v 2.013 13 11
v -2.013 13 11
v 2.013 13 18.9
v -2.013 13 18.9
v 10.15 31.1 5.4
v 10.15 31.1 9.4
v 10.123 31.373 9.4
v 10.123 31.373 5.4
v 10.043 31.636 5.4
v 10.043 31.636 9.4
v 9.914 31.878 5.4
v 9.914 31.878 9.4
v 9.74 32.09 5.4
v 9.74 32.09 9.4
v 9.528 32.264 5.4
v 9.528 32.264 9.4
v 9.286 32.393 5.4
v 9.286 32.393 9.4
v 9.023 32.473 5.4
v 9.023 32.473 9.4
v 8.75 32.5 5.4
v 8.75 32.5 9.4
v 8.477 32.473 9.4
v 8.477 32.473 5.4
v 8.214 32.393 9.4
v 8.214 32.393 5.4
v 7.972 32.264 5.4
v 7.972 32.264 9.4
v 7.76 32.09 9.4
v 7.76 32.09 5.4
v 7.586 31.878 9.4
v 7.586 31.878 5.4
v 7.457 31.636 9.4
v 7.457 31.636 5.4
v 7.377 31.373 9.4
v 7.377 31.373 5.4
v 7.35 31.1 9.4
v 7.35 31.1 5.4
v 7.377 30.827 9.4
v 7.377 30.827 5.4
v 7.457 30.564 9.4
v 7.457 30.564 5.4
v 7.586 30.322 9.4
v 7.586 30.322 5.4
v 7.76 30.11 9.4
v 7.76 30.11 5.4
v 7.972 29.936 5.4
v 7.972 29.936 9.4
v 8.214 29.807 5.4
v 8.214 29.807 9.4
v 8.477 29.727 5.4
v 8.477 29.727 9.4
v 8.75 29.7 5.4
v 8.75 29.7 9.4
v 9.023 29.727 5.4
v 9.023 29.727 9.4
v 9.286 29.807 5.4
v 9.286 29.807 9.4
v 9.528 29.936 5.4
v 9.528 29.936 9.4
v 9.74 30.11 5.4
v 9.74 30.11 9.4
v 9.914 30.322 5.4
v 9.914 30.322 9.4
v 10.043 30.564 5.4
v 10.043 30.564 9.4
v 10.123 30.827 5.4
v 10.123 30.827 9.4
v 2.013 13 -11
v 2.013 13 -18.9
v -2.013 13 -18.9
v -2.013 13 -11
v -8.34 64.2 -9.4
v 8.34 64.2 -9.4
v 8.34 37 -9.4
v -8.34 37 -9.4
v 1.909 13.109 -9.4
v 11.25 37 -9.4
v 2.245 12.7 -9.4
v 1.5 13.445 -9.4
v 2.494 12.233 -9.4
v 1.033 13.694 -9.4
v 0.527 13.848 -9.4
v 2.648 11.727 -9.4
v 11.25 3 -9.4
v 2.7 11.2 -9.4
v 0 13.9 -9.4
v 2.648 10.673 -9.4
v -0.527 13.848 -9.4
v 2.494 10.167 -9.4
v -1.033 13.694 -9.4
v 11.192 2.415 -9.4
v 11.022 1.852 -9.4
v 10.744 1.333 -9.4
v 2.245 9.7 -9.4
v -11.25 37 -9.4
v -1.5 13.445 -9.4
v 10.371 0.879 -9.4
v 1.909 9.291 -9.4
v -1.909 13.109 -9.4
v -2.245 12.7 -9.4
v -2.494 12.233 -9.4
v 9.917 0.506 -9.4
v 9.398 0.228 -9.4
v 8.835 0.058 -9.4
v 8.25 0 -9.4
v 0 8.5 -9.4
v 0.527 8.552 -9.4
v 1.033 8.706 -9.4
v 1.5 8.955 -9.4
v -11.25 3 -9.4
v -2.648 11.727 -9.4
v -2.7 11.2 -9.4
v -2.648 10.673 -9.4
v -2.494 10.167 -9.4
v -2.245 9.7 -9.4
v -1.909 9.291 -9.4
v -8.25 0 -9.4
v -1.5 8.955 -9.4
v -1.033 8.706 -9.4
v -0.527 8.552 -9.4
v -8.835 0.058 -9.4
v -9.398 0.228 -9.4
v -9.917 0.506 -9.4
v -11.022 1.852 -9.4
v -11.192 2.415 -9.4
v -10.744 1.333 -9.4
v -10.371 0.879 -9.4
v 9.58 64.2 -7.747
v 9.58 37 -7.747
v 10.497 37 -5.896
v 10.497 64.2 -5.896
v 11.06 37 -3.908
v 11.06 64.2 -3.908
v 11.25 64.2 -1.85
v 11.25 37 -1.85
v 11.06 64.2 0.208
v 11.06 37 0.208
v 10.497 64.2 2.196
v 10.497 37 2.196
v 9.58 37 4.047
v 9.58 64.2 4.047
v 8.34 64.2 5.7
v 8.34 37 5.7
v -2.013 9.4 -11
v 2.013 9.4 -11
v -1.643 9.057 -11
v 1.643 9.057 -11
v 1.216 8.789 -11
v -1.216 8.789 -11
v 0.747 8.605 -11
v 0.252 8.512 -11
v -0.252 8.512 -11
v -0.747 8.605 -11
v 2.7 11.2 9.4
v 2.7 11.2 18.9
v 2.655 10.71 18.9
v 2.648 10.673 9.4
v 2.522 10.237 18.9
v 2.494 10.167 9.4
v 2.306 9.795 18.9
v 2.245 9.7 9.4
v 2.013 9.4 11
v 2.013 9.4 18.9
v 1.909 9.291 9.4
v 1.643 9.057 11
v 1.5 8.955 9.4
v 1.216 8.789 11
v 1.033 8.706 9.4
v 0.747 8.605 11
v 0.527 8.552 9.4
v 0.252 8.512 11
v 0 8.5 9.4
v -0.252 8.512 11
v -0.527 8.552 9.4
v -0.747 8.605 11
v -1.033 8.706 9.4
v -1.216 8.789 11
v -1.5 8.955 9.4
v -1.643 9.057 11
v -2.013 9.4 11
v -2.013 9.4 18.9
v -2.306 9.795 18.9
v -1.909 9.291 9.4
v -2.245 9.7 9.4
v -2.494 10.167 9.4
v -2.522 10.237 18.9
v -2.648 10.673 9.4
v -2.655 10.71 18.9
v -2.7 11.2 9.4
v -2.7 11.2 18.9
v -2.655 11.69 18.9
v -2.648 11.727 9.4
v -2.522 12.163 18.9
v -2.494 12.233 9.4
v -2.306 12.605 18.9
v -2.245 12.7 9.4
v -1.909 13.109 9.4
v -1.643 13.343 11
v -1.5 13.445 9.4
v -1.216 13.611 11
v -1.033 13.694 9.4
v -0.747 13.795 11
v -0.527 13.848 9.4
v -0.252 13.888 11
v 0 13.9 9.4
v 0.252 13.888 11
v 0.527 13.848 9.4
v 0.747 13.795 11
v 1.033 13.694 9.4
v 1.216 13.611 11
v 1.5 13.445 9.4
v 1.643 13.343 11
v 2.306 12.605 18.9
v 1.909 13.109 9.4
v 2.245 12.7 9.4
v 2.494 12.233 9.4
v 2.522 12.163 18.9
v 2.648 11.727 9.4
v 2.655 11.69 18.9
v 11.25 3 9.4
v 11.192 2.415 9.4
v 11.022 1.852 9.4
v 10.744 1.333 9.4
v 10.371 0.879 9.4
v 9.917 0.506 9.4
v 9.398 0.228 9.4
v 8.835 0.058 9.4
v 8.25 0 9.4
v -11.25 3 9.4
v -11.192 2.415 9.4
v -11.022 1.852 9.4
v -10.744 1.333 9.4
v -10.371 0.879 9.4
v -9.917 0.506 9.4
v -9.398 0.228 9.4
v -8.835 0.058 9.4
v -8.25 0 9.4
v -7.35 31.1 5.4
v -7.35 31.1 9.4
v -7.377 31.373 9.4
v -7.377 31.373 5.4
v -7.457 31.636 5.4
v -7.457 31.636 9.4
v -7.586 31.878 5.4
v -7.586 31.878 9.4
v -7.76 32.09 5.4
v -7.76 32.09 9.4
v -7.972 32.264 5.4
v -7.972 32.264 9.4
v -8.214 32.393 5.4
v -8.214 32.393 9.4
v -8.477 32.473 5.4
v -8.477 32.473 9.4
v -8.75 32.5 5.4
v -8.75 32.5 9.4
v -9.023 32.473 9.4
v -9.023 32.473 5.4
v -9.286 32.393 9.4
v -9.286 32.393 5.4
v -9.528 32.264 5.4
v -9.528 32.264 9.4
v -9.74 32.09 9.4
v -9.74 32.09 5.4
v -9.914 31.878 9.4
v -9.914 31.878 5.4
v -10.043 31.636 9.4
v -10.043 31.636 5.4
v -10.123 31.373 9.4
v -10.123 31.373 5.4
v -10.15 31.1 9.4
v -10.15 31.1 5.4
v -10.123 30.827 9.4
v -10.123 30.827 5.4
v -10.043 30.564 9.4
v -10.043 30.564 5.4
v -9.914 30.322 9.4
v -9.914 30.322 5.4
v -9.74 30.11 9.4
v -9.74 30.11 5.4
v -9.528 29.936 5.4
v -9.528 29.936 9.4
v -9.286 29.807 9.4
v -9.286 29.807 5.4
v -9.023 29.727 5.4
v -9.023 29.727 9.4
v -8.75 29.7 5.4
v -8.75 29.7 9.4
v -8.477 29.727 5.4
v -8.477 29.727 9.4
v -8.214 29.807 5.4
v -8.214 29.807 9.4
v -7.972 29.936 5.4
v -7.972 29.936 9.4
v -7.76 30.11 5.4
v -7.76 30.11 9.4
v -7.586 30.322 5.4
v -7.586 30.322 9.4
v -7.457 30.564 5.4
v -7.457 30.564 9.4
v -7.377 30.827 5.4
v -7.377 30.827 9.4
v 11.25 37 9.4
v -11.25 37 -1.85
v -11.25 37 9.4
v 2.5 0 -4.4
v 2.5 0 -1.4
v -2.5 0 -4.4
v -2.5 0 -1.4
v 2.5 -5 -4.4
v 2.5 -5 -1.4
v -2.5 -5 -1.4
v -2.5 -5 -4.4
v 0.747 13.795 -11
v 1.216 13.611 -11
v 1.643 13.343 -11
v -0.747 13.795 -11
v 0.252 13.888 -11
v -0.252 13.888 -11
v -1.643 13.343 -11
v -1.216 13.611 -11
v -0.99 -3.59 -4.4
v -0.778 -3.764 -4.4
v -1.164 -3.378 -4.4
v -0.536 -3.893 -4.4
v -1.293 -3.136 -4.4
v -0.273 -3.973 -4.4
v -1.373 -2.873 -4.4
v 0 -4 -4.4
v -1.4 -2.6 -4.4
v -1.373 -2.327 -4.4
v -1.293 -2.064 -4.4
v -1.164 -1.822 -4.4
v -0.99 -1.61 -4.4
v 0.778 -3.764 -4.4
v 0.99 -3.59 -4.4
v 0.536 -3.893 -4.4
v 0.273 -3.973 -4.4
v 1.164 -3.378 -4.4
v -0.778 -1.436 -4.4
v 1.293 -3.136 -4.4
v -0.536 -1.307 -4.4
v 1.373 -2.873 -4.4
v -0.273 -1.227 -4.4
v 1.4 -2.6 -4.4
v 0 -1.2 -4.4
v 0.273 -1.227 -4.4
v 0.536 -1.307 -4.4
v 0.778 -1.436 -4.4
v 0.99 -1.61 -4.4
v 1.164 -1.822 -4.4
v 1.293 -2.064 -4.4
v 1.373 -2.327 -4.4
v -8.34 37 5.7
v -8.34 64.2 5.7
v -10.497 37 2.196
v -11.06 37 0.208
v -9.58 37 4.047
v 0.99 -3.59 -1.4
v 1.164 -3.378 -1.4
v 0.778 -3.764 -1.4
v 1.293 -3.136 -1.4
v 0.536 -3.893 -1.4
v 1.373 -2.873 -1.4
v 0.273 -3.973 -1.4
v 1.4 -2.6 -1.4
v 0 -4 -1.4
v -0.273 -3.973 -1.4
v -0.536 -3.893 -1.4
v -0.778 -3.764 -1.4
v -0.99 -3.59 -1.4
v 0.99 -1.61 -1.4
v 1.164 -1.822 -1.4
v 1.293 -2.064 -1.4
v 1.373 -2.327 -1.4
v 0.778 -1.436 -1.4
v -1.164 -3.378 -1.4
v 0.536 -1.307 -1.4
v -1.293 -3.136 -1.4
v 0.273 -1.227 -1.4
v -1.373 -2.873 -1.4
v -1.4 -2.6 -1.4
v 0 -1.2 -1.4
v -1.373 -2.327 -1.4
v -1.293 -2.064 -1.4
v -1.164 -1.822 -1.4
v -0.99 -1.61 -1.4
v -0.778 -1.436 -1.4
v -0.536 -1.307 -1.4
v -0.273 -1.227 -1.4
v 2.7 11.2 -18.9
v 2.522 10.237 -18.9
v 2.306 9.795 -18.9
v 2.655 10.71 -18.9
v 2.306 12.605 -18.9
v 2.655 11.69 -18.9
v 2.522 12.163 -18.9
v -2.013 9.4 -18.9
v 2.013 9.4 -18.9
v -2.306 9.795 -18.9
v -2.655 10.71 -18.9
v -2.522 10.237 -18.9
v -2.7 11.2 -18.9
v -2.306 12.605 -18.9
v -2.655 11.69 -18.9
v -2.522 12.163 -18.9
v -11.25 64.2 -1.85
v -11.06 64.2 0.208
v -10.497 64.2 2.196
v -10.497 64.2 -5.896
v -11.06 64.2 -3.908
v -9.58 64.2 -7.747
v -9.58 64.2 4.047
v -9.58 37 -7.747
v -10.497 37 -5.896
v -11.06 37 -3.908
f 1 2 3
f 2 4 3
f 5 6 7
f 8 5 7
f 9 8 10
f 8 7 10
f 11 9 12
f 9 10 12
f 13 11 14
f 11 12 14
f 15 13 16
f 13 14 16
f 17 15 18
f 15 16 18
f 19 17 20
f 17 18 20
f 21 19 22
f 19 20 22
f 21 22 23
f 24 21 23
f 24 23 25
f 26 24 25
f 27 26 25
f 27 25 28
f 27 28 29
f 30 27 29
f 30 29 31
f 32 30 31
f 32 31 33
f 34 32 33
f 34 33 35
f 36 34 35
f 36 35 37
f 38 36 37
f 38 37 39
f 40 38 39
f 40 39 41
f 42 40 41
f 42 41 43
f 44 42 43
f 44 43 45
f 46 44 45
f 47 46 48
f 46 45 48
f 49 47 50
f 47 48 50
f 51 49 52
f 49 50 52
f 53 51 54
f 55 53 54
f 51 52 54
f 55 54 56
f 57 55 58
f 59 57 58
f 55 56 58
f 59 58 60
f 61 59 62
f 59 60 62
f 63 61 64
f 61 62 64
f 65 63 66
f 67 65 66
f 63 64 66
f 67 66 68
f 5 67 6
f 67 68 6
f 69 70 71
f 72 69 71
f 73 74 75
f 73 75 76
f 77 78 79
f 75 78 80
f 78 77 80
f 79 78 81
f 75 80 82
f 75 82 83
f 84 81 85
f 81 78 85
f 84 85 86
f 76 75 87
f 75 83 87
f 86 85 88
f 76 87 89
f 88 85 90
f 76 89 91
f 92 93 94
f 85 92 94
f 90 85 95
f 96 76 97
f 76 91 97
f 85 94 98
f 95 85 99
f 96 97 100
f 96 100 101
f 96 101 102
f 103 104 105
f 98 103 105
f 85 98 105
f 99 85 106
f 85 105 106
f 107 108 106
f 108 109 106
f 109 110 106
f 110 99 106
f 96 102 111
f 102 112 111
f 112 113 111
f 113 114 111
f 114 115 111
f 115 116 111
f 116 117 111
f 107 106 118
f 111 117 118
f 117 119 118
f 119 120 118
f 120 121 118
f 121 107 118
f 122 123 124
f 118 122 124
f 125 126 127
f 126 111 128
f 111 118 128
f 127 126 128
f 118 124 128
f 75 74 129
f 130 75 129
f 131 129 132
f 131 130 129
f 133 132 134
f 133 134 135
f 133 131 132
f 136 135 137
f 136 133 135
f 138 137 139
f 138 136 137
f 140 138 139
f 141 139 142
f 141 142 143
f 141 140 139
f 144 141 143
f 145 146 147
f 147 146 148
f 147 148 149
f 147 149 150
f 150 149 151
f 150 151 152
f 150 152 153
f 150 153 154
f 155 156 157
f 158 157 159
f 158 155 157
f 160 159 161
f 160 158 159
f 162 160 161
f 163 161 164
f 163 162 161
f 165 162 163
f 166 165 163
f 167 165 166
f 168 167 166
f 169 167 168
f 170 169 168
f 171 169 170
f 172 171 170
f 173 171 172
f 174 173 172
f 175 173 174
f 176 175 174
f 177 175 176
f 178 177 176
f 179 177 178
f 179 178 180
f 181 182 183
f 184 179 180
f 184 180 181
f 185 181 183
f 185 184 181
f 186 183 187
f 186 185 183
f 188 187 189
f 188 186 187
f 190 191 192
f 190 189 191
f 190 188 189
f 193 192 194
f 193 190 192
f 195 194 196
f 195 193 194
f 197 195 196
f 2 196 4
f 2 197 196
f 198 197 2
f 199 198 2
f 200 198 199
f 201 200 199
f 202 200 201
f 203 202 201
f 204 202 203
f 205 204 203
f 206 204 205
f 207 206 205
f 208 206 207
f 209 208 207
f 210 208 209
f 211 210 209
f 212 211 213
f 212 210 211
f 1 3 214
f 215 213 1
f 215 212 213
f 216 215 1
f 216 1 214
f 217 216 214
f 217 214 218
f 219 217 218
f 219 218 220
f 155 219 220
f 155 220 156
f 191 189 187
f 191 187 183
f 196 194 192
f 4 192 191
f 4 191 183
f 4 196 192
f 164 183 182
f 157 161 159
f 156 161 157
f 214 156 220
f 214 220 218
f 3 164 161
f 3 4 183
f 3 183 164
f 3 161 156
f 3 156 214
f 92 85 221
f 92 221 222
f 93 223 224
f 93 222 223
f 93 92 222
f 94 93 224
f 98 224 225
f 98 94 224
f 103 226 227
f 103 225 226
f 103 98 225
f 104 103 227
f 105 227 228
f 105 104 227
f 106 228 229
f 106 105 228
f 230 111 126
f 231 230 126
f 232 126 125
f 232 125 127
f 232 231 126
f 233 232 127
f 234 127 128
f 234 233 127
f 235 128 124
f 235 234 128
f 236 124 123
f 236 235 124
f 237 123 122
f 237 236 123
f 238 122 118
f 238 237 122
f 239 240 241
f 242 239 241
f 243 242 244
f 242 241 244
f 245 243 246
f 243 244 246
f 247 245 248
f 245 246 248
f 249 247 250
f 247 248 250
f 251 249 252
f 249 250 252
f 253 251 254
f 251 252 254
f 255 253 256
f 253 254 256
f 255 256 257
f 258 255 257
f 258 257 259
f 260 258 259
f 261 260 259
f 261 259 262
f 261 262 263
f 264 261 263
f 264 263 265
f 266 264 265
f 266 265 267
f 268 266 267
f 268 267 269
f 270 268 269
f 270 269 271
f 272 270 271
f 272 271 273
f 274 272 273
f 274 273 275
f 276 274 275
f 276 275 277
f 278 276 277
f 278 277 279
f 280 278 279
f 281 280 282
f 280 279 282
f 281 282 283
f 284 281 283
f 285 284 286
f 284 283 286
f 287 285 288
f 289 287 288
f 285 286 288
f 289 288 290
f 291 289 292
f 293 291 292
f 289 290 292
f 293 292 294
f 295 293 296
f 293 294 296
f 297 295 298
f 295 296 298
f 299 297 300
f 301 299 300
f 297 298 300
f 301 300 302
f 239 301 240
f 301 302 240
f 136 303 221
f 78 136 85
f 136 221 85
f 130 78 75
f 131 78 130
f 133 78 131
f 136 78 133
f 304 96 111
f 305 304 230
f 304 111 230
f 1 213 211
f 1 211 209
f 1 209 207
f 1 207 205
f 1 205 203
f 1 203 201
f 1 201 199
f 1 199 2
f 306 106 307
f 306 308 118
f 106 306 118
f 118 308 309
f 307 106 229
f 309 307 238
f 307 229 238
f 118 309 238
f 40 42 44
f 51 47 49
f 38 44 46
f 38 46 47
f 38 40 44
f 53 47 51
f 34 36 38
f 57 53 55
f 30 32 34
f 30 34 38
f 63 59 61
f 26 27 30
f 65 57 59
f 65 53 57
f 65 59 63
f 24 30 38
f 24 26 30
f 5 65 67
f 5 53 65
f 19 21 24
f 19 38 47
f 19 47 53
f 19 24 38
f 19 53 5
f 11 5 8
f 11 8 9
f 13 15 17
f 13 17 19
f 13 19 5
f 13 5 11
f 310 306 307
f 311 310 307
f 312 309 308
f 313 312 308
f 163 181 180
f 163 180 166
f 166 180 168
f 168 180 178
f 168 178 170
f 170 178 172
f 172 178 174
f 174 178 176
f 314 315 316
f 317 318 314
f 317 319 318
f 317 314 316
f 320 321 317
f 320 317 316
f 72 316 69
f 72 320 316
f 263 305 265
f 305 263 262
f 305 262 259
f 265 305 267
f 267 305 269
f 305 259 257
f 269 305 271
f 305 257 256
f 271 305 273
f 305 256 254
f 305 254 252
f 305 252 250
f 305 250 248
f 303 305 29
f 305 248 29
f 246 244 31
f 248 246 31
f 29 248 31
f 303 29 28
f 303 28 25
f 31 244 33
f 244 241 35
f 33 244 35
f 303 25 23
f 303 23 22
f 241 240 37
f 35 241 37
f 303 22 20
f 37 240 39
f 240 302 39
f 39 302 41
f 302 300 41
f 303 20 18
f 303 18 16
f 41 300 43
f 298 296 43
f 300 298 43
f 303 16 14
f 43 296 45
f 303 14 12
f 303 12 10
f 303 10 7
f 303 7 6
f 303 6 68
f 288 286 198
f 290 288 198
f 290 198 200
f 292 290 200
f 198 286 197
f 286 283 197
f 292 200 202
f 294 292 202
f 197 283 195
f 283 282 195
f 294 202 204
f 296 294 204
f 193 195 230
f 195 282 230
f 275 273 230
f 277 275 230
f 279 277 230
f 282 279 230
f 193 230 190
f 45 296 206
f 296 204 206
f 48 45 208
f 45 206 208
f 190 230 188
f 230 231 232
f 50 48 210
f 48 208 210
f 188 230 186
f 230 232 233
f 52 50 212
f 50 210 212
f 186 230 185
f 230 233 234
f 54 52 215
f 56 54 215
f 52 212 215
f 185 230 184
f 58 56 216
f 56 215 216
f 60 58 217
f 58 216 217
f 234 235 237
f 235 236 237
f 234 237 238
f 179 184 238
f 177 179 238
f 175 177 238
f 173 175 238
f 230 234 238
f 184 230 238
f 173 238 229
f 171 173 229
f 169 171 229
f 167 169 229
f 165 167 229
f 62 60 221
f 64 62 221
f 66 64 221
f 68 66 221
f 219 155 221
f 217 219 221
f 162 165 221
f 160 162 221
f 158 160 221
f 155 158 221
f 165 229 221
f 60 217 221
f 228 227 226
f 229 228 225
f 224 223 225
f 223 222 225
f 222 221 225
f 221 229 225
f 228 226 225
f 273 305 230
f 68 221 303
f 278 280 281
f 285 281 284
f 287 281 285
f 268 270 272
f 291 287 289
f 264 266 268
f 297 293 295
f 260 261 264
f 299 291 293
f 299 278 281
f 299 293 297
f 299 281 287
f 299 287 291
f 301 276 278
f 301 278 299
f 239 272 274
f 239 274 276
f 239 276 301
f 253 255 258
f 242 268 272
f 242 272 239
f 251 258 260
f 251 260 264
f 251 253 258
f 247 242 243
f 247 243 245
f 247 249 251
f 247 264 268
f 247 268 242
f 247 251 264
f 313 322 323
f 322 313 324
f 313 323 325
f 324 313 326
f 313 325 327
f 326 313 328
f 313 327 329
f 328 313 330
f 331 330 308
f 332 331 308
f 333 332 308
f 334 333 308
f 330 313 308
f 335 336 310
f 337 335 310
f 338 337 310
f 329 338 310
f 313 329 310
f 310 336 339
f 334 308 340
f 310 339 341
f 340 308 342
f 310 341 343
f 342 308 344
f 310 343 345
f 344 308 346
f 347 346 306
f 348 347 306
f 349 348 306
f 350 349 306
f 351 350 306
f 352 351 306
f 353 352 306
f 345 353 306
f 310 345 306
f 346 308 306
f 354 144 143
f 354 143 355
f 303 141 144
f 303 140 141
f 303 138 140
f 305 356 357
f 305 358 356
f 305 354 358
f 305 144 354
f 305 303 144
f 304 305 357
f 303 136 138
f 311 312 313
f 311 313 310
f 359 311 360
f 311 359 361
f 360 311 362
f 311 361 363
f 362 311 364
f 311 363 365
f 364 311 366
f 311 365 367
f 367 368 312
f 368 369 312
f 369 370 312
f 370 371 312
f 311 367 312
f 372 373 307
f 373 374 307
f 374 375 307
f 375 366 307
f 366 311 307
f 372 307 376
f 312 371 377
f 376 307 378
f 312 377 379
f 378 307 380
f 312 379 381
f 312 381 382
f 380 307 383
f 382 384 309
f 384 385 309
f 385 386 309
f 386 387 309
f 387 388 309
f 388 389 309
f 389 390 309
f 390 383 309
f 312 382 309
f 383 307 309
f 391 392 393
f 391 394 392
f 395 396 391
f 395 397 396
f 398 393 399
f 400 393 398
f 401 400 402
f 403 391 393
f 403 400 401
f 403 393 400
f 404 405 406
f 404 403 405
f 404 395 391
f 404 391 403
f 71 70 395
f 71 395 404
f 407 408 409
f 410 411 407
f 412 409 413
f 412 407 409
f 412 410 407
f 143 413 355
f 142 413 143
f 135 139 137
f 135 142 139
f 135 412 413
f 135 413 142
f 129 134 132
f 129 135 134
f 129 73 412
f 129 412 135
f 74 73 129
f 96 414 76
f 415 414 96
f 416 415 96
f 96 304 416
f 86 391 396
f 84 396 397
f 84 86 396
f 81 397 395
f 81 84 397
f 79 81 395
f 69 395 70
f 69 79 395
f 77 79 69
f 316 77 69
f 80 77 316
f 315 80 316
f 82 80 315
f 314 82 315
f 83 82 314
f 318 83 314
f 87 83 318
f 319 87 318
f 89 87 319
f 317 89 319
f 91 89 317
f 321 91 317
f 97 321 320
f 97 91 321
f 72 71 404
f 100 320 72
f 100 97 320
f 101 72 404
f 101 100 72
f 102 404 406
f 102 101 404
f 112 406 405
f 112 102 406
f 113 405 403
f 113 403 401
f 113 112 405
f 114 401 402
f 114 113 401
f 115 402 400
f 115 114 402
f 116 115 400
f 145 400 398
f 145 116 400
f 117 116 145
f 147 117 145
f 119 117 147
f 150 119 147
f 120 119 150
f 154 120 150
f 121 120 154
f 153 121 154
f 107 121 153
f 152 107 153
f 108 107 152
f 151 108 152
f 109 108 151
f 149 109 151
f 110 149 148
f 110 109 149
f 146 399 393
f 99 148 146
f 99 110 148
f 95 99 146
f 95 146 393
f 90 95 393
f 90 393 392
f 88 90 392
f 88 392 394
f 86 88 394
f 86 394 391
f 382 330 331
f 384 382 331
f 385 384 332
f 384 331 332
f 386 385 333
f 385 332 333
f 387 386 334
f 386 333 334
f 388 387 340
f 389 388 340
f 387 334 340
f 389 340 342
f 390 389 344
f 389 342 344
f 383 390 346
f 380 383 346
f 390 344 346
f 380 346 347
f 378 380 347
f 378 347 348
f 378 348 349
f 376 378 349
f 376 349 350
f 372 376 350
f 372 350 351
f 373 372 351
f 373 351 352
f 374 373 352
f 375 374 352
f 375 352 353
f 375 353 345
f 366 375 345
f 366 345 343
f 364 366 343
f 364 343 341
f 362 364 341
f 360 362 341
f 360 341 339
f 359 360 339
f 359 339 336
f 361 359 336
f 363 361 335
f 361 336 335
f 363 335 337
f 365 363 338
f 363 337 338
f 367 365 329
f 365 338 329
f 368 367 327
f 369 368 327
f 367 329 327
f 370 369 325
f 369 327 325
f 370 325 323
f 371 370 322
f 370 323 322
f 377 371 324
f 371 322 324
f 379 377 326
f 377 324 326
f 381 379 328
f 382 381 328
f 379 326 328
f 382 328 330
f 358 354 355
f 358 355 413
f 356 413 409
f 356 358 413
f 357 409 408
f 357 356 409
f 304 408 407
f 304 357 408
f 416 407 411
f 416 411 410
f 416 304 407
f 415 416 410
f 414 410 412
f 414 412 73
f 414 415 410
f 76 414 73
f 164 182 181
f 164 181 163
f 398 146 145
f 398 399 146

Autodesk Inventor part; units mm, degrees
ref_plane "YZ Plane" through (0, 0, 0) normal (1, 0, 0) x (0, 1, 0)
ref_plane "XZ Plane" through (0, 0, 0) normal (0, 1, 0) x (-1, 0, 0)
ref_plane "XY Plane" through (0, 0, 0) normal (0, 0, 1) x (1, 0, 0)
sketch "Sketch1" plane through (0, 0, 0) normal (0, 1, 0) x (-1, 0, 0)
  line L0 (11.25, 9.4) -> (-11.25, 9.4)
  line L1 (-11.25, 9.4) -> (-11.25, -9.4)
  line L2 (-11.25, -9.4) -> (11.25, -9.4)
  line L3 (11.25, -9.4) -> (11.25, 9.4)
  line L4 (11.25, 9.4) -> (-11.25, -9.4) construction
  line L5 (-11.25, 9.4) -> (11.25, -9.4) construction
  point P0 (0, 0)
  dimension "d0" = 22.5
  dimension "d1" = 18.8
extrude "Extrusion1" add sketch "Sketch1" along normal blind 37
sketch "Sketch2" plane through (-11.25, 0, 9.4) normal (0, 0, 1) x (1, 0, 0)
  circle A0 centre (11.25, 11.2) radius 2.7
  line L0 (0, 0) -> (22.5, 0) projected
  line L1 (11.25, 0) -> (11.25, 37) construction
  line L2 (0, 37) -> (22.5, 37) projected
  dimension "d4" = 5.4
  dimension "d5" = 11.2
extrude "Extrusion2" add sketch "Sketch2" along normal blind 9.5
sketch "Sketch3" plane through (0, 11.2, 18.9) normal (0, 0, 1) x (1, 0, 0)
  circle A0 centre (0, 0) radius 2.7 projected
  line L0 (-2.0125, 1.8) -> (2.0125, 1.8)
  line L1 (-2.0125, -1.8) -> (2.0125, -1.8)
  point P0 (0, -11.2)
  dimension "d8" = 3.6
extrude "Extrusion3" cut sketch "Sketch3" against normal blind 7.9 contours L0 A0 | A0 L1
mirror "Mirror1" about plane through (0, 0, 0) normal (0, 0, 1) of "Extrusion2", "Extrusion3"
sketch "Sketch4" plane through (0, 0, 0) normal (0, -1, 0) x (1, 0, 0)
  line L0 (-2.5, -4.4) -> (2.5, -4.4)
  line L1 (2.5, -4.4) -> (2.5, -1.4)
  line L2 (2.5, -1.4) -> (-2.5, -1.4)
  line L3 (-2.5, -1.4) -> (-2.5, -4.4)
  line L4 (-2.5, -4.4) -> (2.5, -1.4) construction
  line L5 (2.5, -4.4) -> (-2.5, -1.4) construction
  line L6 (-11.25, 9.4) -> (11.25, 9.4) construction
  line L7 (0, -26.46) -> (0, 26.46) construction
  point P0 (0, -2.9)
  point P1 (0, -2.9)
  dimension "d11" = 5
  dimension "d12" = 3
  dimension "d22" = 10.8
extrude "Extrusion4" add sketch "Sketch4" along normal blind 5
sketch "Sketch5" plane through (2.5, 0, -4.4) normal (0, 0, -1) x (-1, 0, 0)
  circle A0 centre (2.5, -2.6) radius 1.4
  line L0 (5, -5) -> (0, -5) construction
  line L1 (2.5, 0) -> (2.5, -5) construction
  dimension "d15" = 2.8
  dimension "d16" = 2.4
extrude "Extrusion5" cut sketch "Sketch5" against normal up to next
sketch "Sketch6" plane through (0, 37, 0) normal (0, 1, 0) x (1, 0, 0)
  line L0 (11.25, 9.4) -> (-11.25, 9.4) projected
  line L1 (11.25, -9.4) -> (11.25, 9.4) projected
  line L2 (-11.25, 9.4) -> (11.25, 9.4)
  line L3 (11.25, 9.4) -> (11.25, -5.7)
  line L4 (11.25, -5.7) -> (-11.25, -5.7)
  line L5 (-11.25, -5.7) -> (-11.25, 9.4)
  line L6 (-11.25, -9.4) -> (11.25, -9.4) projected
  circle A0 centre (0, 1.85) radius 11.25
  line L7 (-11.25, 9.4) -> (-11.25, -9.4) projected
  line L8 (11.25, -9.4) -> (11.25, 9.4) projected
  point P0 (0, 0)
  point P1 (-8.3403, 9.4)
  point P2 (-8.3403, -5.7)
  point P3 (8.3403, -5.7)
  point P4 (8.3403, 9.4)
  dimension "d19" = 3.7
  dimension "d23" = 15.1
  dimension "d24" = 7.55
extrude "Extrusion6" add sketch "Sketch6" along normal blind 27.2 contours A0 L4 L0
sketch "Sketch7" plane through (-11.25, 0, 9.4) normal (0, 0, 1) x (1, 0, 0)
  circle A0 centre (2.5, 31.1) radius 1.4
  line L0 (0, 0) -> (22.5, 0) projected
  line L1 (0, 37) -> (22.5, 37) construction
  circle A1 centre (20, 31.1) radius 1.4
  line L2 (0, 0) -> (0, 37) projected
  point P0 (11.25, 0)
  dimension "d25" = 2.8
  dimension "d26" = 31.1
  dimension "d29" = 17.5
  dimension "d34" = 22.5
  dimension "d35" = 2.5
extrude "Extrusion7" cut sketch "Sketch7" against normal blind 4
fillet "Fillet1" radius 3 2 edges at (11.25, 0, 0) (-11.25, 0, 0)
equation "\"d24\" = 0.5 * d23"
equation "\"d35\" = -0.5 * d29 + 0.5 * d34"
properties part number "motor3"
